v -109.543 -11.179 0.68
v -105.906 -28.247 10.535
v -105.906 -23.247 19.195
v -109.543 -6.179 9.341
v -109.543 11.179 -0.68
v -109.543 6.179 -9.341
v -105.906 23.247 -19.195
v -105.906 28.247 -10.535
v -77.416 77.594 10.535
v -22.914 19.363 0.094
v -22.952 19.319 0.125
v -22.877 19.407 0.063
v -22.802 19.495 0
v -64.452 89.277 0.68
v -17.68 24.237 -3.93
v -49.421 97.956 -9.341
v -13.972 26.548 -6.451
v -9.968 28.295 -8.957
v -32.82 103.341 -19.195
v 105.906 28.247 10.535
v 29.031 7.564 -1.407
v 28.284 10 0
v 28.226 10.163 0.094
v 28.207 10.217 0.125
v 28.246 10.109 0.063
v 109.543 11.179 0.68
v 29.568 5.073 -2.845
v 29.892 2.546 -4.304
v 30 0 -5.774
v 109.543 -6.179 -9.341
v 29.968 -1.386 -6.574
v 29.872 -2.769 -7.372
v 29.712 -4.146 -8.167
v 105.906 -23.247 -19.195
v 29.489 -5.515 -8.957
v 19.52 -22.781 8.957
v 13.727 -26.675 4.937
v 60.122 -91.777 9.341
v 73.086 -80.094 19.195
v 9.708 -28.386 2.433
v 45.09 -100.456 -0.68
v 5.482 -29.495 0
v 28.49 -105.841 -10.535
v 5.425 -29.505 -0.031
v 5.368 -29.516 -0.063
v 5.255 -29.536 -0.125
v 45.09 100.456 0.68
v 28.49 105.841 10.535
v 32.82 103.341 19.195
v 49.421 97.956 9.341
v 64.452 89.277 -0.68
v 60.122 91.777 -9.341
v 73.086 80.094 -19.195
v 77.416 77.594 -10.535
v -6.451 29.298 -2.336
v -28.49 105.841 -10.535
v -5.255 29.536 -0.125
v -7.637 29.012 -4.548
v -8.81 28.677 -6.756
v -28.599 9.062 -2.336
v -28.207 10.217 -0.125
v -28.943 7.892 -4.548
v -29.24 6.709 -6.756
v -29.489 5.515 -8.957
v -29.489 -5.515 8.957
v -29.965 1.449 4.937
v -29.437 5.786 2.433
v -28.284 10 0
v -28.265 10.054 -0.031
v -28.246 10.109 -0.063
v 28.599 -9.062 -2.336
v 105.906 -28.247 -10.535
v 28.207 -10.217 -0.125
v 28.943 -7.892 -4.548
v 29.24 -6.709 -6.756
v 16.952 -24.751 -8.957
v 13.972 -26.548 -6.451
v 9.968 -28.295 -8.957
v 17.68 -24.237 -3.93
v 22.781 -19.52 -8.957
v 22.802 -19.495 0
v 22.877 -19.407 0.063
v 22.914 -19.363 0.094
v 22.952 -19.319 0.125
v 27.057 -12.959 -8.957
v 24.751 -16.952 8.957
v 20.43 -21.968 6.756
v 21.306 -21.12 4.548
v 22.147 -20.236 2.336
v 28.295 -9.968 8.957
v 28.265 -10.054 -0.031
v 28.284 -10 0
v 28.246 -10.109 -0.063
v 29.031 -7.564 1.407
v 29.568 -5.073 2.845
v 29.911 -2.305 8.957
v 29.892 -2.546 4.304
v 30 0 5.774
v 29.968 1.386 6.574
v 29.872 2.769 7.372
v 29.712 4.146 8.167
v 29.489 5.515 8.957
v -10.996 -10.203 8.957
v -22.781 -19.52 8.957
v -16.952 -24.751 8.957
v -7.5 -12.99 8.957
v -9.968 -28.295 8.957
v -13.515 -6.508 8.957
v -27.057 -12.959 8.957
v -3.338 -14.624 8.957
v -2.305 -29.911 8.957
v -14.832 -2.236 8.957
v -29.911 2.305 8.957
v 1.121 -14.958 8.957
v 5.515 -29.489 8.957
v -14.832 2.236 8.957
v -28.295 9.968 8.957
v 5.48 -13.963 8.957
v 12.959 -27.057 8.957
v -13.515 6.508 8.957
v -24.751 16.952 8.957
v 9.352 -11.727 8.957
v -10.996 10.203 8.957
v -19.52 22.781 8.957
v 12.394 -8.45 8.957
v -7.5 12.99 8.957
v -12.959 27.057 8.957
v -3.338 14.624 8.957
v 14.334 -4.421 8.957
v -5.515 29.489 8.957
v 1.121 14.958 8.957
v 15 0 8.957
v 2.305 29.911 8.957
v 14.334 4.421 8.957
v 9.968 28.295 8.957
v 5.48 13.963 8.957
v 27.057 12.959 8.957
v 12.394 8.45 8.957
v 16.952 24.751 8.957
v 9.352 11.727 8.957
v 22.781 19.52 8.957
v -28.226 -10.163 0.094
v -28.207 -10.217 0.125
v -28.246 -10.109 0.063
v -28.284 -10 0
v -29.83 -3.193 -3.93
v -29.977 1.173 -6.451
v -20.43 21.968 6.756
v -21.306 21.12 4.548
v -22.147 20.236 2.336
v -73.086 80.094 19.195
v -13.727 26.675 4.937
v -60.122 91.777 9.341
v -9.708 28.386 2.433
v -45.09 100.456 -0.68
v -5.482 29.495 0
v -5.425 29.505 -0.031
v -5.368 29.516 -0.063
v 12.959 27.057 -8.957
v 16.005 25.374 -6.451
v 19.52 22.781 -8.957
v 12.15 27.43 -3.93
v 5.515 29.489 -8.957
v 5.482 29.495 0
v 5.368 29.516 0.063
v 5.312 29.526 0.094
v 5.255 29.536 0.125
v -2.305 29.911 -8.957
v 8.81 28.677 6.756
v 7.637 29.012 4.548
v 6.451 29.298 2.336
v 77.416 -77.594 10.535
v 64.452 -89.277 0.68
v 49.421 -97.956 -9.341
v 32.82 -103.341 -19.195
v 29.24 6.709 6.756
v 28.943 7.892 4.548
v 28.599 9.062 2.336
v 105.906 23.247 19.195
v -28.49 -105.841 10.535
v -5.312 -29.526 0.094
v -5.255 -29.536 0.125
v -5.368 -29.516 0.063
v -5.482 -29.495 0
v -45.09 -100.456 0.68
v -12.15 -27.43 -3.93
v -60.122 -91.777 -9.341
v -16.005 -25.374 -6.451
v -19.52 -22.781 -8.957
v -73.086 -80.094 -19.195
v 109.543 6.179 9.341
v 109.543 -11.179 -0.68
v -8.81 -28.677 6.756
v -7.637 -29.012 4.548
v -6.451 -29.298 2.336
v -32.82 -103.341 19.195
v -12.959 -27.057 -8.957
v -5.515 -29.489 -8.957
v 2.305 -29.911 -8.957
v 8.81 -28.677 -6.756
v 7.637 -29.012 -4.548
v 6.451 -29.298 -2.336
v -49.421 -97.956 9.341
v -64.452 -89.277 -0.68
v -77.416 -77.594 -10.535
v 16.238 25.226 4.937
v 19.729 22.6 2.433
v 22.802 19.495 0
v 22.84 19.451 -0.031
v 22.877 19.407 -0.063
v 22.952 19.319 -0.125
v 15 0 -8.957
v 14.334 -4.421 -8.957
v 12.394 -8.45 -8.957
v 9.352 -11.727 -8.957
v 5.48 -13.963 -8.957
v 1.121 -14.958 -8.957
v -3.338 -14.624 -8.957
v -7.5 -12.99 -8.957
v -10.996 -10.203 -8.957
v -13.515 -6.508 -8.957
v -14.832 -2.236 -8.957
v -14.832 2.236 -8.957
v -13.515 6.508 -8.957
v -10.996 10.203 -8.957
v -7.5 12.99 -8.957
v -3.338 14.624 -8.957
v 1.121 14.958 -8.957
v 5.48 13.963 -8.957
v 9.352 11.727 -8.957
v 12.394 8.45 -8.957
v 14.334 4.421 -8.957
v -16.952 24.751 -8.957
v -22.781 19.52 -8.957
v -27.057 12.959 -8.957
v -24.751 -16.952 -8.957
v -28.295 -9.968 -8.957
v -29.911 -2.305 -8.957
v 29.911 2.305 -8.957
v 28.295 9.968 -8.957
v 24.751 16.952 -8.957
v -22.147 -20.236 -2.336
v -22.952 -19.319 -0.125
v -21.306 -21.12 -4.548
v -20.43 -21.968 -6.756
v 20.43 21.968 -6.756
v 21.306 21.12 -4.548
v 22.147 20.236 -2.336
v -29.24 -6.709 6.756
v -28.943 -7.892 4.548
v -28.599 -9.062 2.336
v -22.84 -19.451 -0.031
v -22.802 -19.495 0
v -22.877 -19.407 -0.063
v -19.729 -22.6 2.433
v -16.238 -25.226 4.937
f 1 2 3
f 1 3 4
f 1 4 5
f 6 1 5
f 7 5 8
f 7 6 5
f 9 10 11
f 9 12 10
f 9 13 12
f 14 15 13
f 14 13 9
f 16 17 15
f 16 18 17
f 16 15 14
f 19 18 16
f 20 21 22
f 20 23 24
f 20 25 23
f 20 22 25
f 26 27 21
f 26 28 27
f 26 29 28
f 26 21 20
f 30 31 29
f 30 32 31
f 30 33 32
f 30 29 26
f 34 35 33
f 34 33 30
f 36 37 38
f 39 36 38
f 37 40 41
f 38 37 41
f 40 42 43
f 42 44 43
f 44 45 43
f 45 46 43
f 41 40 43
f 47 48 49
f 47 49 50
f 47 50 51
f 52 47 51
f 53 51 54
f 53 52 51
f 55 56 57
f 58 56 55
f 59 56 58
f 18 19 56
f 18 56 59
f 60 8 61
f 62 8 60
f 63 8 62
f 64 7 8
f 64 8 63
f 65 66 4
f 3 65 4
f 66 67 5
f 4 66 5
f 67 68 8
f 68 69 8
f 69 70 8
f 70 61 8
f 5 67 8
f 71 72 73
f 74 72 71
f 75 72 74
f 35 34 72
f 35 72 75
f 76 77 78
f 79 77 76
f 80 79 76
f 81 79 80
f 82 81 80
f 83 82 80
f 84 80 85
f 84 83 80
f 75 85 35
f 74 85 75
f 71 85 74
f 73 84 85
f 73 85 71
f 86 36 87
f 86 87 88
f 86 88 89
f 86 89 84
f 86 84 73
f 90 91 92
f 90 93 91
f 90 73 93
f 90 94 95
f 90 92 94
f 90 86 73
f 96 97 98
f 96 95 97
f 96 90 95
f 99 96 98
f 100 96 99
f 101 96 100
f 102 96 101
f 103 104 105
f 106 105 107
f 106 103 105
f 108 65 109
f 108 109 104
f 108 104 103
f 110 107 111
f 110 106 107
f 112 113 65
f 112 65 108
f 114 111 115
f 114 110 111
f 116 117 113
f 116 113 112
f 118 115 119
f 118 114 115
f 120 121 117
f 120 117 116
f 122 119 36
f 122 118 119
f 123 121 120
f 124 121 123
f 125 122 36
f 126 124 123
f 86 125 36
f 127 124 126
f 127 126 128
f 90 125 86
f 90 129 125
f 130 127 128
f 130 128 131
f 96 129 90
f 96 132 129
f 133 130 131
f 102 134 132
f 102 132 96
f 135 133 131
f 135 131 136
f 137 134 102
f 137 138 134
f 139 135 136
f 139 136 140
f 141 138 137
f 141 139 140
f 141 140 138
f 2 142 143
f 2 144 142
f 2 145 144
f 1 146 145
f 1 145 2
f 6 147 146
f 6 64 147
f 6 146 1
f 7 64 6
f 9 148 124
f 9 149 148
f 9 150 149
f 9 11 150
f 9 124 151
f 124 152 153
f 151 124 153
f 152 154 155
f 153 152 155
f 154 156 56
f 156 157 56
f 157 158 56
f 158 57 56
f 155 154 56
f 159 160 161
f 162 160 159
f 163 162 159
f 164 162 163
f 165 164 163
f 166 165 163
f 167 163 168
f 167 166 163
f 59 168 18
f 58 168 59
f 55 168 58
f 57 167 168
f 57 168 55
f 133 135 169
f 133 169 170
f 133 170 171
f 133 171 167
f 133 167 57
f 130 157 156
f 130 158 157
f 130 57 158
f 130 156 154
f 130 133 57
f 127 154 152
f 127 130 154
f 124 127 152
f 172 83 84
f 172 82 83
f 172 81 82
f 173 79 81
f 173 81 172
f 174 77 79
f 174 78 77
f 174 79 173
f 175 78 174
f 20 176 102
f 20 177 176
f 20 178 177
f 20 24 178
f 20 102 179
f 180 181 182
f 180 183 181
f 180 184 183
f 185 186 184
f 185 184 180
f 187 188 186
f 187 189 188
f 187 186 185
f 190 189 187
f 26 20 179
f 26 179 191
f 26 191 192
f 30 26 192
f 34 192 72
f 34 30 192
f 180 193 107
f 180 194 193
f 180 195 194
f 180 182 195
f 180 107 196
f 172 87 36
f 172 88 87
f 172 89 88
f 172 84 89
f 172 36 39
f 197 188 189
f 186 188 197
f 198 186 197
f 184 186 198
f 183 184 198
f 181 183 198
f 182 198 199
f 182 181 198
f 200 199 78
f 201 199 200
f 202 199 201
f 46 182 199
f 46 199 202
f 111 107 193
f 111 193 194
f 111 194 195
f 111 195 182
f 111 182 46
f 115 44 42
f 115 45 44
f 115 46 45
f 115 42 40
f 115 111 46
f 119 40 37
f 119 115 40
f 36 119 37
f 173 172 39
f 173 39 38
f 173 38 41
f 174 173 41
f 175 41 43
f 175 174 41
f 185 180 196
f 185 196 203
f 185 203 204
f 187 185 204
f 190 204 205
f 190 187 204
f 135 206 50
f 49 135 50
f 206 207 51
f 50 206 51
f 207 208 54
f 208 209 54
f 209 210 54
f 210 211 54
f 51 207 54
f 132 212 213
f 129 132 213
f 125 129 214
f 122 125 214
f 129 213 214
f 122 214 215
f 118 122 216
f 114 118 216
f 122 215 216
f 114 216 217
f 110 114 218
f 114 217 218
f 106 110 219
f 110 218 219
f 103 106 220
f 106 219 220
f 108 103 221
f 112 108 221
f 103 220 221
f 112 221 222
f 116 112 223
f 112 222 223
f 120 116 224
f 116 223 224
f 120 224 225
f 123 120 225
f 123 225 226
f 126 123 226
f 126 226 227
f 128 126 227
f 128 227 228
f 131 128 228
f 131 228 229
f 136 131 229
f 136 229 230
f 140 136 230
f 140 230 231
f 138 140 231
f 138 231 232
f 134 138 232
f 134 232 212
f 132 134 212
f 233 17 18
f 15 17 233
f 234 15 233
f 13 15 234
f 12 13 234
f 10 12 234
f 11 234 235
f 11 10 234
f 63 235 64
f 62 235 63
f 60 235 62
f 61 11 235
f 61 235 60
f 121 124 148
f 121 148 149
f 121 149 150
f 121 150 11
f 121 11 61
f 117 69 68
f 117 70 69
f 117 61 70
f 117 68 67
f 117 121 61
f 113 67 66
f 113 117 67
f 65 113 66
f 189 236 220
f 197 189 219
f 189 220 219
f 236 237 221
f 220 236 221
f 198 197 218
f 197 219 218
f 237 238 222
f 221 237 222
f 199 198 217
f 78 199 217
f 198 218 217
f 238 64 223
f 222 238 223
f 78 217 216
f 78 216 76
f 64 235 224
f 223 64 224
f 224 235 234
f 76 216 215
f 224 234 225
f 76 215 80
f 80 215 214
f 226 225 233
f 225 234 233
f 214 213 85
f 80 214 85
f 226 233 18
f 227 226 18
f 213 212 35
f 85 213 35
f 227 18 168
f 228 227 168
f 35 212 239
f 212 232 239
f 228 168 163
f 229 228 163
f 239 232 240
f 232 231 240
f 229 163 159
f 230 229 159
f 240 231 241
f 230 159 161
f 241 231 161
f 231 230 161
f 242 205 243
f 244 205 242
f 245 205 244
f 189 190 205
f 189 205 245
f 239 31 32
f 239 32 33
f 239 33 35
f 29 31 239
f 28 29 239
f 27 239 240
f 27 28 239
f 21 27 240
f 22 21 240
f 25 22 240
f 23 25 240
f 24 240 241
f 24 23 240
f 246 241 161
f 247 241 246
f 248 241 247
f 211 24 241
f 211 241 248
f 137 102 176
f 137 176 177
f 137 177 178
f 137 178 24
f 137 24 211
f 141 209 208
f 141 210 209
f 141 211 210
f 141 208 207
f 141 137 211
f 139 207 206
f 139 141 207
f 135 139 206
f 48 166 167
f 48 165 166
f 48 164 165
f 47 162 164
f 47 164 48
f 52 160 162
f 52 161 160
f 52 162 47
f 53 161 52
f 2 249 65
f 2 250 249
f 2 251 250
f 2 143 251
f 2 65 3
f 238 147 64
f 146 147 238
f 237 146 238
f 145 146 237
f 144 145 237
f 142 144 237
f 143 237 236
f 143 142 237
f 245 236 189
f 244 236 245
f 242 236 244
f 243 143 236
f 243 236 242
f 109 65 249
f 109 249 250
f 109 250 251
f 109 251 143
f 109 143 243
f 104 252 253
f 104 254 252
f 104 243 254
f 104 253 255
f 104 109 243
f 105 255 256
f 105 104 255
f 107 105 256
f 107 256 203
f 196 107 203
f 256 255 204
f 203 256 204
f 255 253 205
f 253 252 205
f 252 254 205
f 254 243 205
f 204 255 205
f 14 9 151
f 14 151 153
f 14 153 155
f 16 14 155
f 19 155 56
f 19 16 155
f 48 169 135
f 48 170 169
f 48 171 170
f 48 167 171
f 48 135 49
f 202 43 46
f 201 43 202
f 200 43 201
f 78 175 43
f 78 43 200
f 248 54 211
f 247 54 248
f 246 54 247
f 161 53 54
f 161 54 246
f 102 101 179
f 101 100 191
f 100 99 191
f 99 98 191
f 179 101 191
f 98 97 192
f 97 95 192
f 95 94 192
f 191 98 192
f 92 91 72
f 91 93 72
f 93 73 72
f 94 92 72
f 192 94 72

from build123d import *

# Parameters (mm, degrees)
F3_DEPTH      = 5
F3_DEPTH_BACK = 5
F5_COUNT      = 6
F6_R          = 30
F7_DEPTH      = 20
F7_DEPTH_BACK = 20
F9_R          = 30
F10_DEPTH     = 25
F12_R         = 30
F13_DEPTH     = 25
F14_R         = 15
F15_DEPTH     = 25


with BuildPart() as f3:
    # F2 (on face) → F3 (new body, two sides)
    with BuildSketch(Plane(origin=(0, 0, 0), x_dir=(1, 0, 0), z_dir=(0, 0.5, -0.8660254038))) as f3_sk:
        with BuildLine():
            Line((0, -1.3531434218), (105.9060541663, -29.7305851092))
            ThreePointArc((105.9060541663, -29.7305851092), (110, 0), (105.9060541663, 29.7305851092))
            Line((105.9060541663, 29.7305851092), (-5.05, 0))
            Line((-5.05, 0), (0, 0))
            Line((0, 0), (0, -1.3531434218))
        make_face()
    extrude(amount=F3_DEPTH)
    extrude(f3_sk.sketch, amount=-F3_DEPTH_BACK)

    # F5: F3 ×6 about axis
    f5_axis = Axis((0, 0, 14.0805), (0, 0, 1))


with BuildPart() as f3_1:
    add(f3.part)
    for i in range(1, F5_COUNT):
        add(f3.part.rotate(f5_axis, i * 360 / F5_COUNT))

    # F6 (on Top) → F7 (join, two sides)
    with BuildSketch(Plane.XY) as f7_sk:
        Circle(F6_R)
    extrude(amount=F7_DEPTH)
    extrude(f7_sk.sketch, amount=-F7_DEPTH_BACK)

    # F9 (on plane+point) → F10 (cut)
    with BuildSketch(Plane.XY.offset(8.9574447446)):
        Circle(F9_R)
    extrude(amount=F10_DEPTH, mode=Mode.SUBTRACT)

    # F12 (on plane+point) → F13 (cut)
    with BuildSketch(Plane.XY.offset(-8.9574447446)):
        Circle(F12_R)
    extrude(amount=-F13_DEPTH, mode=Mode.SUBTRACT)

    # F14 (on face) → F15 (cut)
    with BuildSketch(Plane(origin=(0, 0, -8.9574447446), x_dir=(1, 0, 0), z_dir=(0, 0, -1))):
        Circle(F14_R)
    extrude(amount=-F15_DEPTH, mode=Mode.SUBTRACT)


solid = f3_1.part
